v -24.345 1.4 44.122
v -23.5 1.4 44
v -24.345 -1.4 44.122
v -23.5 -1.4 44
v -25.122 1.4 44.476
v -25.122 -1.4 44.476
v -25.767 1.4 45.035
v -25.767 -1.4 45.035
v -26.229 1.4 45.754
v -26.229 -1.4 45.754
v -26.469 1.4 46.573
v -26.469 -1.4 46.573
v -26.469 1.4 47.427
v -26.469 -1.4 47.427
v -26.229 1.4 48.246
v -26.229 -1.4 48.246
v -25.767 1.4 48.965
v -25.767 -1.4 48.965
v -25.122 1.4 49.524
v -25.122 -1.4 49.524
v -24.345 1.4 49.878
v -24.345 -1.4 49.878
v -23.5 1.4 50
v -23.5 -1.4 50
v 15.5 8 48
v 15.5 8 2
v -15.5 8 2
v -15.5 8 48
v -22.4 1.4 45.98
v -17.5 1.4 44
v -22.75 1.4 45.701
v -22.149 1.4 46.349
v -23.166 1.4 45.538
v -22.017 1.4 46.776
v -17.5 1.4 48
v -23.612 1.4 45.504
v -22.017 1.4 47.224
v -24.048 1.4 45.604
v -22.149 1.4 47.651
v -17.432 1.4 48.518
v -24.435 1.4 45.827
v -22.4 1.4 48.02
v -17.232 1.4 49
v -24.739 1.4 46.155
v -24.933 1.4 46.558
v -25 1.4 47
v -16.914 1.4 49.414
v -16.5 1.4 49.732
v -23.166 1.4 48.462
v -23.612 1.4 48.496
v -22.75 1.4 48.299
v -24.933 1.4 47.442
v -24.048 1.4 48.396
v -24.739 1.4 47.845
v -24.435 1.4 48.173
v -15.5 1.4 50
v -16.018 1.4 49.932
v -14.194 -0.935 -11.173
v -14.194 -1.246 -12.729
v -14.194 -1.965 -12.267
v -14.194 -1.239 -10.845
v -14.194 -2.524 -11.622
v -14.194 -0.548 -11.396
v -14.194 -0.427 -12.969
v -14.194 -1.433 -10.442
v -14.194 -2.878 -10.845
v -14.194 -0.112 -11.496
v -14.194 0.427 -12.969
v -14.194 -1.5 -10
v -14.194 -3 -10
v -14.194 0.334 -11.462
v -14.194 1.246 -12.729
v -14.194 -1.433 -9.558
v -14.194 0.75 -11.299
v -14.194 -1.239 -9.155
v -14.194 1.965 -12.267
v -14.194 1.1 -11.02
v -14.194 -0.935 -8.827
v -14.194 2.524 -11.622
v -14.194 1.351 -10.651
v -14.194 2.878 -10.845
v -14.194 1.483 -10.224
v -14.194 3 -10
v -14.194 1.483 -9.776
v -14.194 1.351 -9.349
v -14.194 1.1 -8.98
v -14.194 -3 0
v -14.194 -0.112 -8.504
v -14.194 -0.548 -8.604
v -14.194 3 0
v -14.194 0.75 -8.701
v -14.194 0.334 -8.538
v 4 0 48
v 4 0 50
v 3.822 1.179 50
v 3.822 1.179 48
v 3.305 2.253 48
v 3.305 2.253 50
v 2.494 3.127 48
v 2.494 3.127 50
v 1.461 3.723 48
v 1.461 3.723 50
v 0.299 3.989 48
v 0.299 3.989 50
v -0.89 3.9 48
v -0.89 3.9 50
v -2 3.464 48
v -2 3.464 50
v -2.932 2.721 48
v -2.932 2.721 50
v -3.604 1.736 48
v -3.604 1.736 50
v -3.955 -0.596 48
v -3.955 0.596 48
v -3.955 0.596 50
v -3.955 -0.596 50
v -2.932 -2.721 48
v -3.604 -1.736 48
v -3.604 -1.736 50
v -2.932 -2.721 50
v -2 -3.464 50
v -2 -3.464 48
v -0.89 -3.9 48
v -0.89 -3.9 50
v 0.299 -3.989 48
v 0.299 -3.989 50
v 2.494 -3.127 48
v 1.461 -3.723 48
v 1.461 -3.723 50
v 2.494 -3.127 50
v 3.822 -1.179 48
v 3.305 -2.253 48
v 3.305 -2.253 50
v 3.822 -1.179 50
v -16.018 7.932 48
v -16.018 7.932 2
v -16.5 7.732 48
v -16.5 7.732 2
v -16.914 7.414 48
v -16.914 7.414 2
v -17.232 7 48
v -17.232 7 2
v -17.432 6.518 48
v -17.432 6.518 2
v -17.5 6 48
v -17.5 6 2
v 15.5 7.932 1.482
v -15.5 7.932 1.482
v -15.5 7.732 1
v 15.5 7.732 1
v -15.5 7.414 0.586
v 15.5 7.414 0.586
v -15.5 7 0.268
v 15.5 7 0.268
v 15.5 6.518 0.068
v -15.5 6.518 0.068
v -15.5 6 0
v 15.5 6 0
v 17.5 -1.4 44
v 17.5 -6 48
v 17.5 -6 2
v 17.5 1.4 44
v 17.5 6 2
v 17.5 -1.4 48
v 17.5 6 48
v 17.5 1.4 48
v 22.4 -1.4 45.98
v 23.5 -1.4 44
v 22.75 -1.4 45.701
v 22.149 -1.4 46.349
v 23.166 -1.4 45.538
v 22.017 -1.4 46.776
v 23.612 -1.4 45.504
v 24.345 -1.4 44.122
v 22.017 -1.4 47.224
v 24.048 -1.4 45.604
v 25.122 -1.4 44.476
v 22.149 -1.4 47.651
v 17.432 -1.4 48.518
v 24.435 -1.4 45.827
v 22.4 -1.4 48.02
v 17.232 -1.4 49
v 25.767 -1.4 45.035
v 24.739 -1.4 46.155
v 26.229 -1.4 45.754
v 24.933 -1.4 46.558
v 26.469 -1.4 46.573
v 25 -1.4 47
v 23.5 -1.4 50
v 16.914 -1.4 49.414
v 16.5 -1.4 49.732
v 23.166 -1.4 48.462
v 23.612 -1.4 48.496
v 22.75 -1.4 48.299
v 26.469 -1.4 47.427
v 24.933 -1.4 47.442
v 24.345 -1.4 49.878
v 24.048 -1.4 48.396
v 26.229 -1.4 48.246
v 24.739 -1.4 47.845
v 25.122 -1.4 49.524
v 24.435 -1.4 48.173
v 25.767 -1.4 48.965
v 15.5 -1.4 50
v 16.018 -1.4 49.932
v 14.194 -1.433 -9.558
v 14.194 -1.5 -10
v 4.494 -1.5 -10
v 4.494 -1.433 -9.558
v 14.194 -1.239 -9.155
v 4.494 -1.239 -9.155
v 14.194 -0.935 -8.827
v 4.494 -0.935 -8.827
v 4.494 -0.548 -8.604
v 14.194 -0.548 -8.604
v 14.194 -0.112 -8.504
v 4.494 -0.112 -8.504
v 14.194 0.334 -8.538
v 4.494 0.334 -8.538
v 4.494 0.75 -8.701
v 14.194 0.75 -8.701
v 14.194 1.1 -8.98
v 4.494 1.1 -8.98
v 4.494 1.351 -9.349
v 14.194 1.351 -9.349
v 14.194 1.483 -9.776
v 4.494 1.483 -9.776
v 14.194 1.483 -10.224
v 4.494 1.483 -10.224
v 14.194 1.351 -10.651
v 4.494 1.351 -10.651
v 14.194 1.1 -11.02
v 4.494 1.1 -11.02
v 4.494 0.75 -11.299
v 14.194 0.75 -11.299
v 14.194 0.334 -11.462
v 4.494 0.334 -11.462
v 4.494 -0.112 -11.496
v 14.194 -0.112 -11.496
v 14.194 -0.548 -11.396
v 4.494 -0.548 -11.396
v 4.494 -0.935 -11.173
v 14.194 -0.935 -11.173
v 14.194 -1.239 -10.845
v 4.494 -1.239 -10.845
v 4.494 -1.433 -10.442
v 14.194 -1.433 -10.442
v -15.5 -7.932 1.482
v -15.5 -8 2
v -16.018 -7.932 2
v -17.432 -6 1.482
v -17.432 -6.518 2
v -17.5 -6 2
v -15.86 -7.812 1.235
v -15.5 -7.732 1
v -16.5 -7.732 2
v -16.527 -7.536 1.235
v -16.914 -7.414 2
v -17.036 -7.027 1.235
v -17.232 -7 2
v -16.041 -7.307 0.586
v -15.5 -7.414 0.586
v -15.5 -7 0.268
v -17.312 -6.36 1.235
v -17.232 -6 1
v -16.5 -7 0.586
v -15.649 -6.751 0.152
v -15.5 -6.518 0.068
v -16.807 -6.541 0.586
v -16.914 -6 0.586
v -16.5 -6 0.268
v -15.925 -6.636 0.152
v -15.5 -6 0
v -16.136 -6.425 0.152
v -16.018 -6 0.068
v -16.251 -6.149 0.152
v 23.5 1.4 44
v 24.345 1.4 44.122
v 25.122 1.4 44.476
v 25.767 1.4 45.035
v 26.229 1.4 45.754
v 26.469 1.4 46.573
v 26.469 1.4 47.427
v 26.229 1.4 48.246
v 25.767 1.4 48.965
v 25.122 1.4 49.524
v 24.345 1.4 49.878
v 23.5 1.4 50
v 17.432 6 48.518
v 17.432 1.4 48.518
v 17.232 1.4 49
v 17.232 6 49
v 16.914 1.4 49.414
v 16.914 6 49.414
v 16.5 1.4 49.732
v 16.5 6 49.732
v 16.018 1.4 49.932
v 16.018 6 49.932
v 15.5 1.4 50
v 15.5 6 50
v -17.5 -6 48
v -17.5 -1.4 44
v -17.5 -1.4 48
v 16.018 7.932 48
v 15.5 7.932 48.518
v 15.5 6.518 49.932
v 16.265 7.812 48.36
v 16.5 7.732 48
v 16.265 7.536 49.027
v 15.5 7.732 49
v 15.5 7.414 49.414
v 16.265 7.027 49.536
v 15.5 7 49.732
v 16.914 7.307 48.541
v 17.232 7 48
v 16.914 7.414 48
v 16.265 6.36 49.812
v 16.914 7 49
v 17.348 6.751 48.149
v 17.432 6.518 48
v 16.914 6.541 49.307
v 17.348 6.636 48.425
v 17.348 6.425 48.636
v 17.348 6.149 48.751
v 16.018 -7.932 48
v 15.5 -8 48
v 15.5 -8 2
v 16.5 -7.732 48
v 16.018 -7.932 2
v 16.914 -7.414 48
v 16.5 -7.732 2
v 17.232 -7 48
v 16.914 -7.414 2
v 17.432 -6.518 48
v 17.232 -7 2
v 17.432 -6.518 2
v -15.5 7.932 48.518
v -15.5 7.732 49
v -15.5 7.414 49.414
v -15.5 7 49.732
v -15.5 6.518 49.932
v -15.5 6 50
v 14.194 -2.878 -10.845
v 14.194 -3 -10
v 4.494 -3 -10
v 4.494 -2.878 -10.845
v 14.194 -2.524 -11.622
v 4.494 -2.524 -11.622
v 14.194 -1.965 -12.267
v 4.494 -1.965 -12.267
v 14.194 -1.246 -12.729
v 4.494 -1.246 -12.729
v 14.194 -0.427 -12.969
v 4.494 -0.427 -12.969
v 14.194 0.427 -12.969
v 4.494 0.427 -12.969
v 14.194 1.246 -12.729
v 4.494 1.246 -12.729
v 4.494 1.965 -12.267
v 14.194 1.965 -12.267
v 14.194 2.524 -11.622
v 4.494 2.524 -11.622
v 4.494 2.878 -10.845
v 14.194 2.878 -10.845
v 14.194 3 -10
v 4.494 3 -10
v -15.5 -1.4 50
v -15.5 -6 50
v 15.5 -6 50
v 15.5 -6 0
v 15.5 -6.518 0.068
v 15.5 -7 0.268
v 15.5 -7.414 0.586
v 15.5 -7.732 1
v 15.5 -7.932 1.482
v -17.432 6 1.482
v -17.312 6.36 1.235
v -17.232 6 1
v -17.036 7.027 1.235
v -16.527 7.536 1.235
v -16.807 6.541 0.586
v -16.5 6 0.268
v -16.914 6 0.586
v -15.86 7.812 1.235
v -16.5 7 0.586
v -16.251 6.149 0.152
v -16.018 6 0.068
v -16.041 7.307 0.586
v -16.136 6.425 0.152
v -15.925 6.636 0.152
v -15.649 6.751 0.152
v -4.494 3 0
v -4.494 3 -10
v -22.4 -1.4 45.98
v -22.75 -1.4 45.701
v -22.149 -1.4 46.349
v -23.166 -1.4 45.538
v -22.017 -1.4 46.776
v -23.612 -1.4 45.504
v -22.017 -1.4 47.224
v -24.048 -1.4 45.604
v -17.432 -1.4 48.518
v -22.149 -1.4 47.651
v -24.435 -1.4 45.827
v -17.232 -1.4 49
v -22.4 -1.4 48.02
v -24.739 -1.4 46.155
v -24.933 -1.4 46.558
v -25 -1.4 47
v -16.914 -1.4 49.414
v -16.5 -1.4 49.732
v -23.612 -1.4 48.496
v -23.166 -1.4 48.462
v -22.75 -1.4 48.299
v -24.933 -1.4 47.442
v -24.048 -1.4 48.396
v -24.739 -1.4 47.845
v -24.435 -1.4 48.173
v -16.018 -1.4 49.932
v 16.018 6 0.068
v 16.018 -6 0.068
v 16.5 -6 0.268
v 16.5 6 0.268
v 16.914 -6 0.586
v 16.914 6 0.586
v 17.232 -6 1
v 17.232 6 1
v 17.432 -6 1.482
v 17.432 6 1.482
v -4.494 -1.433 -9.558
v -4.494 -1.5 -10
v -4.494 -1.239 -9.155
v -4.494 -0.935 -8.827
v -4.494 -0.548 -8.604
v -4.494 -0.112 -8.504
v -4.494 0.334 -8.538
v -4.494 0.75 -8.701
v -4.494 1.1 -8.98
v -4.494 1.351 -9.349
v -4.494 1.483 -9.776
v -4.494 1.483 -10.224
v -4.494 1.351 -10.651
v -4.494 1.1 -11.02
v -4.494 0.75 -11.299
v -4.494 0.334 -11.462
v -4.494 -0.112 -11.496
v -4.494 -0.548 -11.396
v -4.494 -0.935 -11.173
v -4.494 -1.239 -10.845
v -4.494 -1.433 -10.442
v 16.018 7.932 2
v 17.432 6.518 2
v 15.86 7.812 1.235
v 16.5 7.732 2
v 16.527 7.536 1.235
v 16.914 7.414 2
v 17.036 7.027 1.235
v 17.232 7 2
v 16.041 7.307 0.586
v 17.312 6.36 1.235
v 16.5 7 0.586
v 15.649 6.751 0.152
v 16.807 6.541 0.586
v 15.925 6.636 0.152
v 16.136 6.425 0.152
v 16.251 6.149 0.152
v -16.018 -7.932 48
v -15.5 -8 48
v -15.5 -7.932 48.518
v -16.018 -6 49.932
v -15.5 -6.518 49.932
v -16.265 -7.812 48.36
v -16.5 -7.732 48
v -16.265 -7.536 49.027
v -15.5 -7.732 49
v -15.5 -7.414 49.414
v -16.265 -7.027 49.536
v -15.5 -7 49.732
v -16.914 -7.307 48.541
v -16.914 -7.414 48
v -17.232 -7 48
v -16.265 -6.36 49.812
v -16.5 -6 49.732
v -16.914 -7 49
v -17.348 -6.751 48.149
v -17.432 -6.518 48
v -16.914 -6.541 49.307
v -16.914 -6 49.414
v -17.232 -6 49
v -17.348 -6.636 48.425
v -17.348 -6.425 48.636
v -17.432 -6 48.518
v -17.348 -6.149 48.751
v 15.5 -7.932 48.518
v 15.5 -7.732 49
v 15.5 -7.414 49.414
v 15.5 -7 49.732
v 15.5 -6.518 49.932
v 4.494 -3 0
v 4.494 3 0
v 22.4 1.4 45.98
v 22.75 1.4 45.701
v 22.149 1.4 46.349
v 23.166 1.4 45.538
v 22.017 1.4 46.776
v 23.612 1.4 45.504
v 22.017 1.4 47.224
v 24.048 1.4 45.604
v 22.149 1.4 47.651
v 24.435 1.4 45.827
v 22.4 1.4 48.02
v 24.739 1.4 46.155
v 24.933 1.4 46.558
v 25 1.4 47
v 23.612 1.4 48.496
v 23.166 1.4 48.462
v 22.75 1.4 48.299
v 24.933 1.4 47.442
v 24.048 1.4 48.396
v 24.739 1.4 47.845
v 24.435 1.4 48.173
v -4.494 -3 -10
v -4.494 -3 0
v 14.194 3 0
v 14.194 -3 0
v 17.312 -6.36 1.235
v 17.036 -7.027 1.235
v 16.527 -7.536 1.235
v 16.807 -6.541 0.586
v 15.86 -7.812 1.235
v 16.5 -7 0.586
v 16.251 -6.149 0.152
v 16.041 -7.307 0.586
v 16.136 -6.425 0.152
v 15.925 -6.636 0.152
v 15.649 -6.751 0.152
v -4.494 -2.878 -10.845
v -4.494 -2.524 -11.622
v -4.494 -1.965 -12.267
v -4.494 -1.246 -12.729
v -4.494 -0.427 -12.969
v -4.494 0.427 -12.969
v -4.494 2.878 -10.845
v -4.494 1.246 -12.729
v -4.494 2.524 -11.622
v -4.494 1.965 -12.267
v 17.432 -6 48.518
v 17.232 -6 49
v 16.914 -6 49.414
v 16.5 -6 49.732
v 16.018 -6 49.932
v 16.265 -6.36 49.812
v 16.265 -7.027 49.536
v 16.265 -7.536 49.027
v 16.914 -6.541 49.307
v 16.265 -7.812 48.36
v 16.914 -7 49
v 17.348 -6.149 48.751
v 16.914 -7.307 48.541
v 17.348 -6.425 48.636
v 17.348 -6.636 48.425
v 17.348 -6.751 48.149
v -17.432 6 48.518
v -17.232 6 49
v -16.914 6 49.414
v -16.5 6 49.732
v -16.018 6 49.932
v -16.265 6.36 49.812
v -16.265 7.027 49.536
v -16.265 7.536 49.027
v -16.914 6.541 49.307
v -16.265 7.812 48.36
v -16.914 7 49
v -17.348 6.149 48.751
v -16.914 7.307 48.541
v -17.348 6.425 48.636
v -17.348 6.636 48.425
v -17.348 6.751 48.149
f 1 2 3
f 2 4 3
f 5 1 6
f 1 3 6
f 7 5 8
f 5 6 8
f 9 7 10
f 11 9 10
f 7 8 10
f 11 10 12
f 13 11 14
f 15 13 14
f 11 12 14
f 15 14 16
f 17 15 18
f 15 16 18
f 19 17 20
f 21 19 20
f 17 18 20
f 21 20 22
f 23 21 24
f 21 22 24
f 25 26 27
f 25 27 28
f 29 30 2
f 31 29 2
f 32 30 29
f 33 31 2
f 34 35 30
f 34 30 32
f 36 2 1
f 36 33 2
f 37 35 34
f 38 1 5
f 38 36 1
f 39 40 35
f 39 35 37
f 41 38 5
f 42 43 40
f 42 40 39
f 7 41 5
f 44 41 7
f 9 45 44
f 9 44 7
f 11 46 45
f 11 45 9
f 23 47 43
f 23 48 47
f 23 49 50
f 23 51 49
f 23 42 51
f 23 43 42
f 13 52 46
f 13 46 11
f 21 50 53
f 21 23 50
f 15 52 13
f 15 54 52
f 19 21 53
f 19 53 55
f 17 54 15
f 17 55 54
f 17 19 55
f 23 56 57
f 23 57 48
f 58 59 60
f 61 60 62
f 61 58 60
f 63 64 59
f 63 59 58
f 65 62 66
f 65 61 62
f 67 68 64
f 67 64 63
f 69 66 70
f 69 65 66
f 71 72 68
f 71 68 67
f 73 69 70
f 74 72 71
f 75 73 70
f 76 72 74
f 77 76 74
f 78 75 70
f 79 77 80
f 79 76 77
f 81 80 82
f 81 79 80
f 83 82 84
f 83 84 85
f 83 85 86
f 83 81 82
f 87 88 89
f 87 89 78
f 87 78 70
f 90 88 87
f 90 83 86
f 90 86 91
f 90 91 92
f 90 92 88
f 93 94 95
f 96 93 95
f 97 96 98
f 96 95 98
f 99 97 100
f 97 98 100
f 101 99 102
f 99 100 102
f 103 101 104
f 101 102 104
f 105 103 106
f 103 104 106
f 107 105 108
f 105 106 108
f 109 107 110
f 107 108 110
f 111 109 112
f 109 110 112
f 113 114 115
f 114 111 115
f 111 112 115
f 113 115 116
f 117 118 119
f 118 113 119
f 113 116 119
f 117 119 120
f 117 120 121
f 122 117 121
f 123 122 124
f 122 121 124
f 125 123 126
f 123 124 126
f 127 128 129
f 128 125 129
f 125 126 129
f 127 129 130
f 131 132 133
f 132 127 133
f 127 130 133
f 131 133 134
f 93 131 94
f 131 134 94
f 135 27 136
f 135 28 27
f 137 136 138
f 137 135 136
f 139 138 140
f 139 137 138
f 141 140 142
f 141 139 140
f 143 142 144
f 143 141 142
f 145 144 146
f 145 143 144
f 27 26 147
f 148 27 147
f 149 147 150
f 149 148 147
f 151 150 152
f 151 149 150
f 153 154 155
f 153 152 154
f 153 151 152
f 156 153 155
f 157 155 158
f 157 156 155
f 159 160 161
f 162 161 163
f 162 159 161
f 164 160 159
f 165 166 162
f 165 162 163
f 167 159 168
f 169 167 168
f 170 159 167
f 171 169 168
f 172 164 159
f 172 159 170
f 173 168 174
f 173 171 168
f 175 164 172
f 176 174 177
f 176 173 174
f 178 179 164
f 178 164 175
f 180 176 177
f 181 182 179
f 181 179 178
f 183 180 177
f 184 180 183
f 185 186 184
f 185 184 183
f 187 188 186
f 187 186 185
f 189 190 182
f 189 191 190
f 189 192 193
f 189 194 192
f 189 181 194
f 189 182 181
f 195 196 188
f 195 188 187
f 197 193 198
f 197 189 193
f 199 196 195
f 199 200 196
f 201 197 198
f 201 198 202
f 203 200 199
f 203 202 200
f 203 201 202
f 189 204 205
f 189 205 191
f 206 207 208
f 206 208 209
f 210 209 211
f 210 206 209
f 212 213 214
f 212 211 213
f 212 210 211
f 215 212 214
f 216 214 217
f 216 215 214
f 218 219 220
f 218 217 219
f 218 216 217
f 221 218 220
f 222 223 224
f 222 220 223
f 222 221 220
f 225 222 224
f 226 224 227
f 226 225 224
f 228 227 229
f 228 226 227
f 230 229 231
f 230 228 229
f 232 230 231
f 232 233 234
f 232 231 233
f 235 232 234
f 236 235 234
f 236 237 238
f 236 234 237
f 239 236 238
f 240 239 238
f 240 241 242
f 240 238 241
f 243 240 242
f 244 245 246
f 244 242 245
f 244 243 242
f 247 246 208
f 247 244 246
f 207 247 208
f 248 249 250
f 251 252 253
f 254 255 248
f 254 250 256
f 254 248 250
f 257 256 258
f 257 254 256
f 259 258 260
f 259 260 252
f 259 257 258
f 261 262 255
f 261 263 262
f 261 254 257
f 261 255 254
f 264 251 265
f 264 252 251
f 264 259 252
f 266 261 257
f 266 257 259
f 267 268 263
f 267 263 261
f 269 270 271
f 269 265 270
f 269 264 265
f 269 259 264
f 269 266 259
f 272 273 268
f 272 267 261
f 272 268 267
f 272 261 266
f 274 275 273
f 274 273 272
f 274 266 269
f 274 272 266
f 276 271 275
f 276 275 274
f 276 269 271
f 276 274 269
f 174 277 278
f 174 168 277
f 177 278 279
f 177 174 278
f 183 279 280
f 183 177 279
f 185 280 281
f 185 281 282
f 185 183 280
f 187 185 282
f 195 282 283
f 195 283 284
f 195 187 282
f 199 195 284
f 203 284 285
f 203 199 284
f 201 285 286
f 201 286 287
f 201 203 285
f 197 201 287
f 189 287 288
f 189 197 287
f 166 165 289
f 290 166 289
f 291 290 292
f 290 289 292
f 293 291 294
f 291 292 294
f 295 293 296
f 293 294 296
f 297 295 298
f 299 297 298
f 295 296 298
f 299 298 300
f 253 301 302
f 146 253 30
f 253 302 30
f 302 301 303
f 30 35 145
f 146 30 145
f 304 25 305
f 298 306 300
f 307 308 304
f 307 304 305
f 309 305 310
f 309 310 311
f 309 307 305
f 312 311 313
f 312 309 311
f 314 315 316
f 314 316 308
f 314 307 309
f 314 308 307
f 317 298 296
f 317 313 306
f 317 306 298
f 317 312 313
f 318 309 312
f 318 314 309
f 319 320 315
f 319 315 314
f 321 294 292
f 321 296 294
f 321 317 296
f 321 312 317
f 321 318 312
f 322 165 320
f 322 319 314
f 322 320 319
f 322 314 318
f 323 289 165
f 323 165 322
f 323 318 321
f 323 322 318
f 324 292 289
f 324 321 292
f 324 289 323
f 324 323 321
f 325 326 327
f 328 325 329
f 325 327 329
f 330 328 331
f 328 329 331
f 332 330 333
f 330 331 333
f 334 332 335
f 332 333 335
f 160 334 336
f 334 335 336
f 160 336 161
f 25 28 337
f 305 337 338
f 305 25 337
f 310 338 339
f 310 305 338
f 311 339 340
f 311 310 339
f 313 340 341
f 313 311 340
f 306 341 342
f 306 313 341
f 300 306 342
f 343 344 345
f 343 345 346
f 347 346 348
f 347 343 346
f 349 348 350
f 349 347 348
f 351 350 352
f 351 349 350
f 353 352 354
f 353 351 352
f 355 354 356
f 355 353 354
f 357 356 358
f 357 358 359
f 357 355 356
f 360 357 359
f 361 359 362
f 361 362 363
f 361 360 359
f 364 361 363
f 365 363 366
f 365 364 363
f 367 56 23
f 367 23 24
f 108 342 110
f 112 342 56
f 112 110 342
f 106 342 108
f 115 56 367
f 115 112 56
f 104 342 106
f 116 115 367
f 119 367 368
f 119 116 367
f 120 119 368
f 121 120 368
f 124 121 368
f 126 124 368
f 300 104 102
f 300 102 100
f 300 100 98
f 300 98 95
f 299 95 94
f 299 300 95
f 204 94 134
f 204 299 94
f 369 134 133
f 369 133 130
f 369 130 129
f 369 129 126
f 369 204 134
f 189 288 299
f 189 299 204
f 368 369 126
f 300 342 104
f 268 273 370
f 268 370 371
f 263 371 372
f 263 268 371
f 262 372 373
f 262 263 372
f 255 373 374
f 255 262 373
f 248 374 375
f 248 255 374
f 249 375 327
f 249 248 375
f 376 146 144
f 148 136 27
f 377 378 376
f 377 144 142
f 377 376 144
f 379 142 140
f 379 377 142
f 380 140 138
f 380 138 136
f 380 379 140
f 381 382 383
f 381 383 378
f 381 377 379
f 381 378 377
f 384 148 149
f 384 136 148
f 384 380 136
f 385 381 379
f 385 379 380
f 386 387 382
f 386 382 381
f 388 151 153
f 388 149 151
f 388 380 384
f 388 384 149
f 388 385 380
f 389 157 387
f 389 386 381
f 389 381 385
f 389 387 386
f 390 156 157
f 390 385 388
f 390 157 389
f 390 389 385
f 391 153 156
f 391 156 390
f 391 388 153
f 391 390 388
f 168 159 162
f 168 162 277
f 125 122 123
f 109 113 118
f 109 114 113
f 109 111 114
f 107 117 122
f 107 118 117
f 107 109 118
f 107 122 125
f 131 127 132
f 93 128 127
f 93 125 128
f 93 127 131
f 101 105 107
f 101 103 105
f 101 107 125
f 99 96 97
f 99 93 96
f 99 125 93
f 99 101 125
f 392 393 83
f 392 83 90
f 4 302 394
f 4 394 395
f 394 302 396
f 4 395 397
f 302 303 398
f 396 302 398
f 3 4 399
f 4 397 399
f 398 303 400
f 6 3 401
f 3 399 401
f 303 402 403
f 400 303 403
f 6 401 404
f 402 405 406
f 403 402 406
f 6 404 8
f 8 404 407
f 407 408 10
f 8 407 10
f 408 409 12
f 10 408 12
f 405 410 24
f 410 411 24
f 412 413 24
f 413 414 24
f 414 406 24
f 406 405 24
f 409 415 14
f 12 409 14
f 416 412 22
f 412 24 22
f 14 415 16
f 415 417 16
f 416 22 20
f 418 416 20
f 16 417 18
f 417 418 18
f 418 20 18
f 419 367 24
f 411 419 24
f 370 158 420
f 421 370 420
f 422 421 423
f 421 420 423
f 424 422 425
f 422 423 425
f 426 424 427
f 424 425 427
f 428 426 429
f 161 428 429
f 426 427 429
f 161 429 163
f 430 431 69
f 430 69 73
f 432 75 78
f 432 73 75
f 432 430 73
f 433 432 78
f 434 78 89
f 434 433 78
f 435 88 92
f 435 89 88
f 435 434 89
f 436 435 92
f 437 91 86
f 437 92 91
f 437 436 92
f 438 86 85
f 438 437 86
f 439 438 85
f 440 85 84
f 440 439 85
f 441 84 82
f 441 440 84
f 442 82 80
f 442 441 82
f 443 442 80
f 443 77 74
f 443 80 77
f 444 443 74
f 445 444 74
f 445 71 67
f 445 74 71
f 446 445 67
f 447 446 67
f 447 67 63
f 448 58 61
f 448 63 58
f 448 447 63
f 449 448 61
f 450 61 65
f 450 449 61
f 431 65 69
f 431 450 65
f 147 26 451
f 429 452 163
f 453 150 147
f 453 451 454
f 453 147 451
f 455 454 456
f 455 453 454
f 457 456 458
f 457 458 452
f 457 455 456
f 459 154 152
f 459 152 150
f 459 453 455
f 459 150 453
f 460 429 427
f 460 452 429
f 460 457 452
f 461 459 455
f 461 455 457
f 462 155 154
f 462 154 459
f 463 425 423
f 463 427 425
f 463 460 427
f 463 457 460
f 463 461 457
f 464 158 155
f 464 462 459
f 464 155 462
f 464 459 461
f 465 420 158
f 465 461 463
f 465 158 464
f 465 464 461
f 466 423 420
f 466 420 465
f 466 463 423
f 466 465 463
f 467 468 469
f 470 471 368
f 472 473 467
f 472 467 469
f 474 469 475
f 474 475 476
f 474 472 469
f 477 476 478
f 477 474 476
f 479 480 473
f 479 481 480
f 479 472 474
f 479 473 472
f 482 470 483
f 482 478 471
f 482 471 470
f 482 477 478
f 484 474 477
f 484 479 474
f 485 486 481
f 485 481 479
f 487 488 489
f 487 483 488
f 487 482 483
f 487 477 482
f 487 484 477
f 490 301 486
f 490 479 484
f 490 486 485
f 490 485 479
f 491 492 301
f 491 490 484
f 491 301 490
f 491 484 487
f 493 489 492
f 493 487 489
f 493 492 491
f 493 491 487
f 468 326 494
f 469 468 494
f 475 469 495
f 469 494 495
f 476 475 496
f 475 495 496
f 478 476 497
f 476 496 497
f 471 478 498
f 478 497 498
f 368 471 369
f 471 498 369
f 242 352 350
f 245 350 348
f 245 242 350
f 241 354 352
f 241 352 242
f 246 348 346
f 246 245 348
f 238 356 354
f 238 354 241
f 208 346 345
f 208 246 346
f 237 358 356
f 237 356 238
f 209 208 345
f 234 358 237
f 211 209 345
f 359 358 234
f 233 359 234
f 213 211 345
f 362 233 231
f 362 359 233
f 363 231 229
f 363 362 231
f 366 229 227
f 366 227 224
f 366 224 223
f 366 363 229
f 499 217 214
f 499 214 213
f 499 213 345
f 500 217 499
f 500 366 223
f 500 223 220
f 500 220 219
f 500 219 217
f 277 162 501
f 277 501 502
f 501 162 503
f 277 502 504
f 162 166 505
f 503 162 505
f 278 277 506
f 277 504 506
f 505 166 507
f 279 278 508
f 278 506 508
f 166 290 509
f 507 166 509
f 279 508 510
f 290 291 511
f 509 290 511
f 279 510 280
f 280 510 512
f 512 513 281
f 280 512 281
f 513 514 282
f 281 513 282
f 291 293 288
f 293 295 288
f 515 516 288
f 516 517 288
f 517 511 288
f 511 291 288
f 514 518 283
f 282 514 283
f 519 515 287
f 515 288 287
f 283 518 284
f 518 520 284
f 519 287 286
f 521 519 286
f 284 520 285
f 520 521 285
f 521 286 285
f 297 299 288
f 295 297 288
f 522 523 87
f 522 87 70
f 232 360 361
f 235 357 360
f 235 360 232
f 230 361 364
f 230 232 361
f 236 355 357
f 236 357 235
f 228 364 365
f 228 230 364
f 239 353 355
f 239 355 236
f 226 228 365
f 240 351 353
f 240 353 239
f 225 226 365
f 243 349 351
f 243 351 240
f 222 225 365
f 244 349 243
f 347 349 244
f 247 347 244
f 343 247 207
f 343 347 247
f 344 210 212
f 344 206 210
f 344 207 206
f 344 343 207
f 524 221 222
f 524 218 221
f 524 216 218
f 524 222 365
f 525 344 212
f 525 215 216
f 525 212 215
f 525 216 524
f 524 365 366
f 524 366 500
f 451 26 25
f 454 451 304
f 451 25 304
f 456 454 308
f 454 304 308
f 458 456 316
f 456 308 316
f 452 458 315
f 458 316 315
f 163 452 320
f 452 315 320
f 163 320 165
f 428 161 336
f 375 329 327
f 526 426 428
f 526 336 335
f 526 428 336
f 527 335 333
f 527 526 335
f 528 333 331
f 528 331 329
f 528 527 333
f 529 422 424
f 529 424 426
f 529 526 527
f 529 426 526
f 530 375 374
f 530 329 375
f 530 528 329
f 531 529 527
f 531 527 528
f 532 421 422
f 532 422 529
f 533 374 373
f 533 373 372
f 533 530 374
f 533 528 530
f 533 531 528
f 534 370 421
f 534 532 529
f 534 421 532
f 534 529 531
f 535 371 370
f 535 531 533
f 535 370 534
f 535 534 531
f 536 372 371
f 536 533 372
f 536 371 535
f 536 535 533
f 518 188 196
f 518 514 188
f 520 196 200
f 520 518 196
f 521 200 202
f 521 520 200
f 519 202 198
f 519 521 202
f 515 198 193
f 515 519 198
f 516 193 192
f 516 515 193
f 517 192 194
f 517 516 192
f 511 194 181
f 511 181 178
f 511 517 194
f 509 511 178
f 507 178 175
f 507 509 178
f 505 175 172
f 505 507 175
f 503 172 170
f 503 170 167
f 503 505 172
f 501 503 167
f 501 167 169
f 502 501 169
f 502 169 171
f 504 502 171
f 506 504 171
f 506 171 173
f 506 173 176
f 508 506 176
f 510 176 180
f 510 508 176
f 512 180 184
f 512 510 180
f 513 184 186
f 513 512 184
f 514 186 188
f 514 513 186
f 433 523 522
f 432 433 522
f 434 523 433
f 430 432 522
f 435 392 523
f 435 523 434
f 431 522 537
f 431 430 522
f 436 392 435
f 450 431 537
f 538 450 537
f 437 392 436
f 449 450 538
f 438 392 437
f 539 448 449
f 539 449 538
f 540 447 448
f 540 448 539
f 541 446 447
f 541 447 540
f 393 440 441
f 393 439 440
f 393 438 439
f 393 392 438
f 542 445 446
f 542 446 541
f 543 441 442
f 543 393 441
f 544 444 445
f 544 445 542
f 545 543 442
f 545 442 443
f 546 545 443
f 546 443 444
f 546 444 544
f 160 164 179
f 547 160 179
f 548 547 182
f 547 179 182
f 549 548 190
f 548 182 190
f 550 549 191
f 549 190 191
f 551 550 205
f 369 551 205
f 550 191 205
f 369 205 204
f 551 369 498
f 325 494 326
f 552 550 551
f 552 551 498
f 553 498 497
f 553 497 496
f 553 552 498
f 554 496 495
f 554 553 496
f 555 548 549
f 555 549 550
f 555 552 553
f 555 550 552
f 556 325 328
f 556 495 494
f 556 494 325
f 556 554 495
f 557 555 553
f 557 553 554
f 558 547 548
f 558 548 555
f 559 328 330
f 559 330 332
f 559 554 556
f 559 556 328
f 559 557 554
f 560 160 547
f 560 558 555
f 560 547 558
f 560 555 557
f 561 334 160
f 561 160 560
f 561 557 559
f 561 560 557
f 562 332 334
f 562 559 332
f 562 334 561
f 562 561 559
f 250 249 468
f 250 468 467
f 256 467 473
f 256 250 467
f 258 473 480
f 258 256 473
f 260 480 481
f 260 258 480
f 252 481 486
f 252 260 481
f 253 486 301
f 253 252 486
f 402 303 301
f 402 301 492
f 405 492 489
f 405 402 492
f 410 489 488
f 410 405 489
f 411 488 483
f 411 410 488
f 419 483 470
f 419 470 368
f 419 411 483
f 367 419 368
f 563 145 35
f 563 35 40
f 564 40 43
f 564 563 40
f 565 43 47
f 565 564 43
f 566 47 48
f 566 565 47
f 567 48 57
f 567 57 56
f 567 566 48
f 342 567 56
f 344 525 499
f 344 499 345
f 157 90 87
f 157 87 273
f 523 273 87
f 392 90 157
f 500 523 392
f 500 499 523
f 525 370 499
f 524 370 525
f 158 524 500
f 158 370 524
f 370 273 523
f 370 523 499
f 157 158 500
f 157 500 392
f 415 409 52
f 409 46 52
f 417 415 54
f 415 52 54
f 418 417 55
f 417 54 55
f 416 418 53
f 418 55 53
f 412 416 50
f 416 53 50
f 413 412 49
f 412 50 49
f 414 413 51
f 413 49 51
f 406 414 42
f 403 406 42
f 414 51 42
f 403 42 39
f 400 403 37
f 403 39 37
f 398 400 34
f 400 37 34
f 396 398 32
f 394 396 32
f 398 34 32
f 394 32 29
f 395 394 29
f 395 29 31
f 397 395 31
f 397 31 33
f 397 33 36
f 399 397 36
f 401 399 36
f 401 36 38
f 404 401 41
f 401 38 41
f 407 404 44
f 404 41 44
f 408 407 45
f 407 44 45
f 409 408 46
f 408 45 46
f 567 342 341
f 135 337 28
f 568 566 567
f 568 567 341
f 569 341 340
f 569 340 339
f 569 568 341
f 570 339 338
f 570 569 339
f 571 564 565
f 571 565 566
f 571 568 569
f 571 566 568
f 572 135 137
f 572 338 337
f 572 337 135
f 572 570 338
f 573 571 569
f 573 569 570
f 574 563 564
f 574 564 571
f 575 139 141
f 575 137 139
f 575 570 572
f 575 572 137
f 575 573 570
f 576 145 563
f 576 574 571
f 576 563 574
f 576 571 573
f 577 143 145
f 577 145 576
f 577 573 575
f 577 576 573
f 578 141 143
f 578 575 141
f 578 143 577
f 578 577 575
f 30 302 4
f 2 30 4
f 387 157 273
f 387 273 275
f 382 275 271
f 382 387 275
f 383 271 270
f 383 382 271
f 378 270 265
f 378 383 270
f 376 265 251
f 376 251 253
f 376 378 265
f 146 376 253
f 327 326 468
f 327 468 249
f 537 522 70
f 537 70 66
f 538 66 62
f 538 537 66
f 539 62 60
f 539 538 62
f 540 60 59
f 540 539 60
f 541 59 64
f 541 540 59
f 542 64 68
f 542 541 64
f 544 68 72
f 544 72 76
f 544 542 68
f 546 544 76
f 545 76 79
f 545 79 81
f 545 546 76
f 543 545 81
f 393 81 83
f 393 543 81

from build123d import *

# Parameters (mm, degrees)
F1_DEPTH      = 17.5
F2_W          = 6.3770967536
F2_H          = 17.8738087416
F2_W_2        = 4.4888177946
F3_DEPTH      = 12.5
F5_R          = 4
F6_DEPTH      = 2
F7_R          = 1.5
F8_DEPTH      = 1.4
F10_R         = 2
F11_T1_DEPTH  = 12
F11_T3_DEPTH  = 4.6
F11_T5_DEPTH  = 4.6
F11_S9_W      = 2
F11_S9_H      = 2
F11_T10_DEPTH = 2
F11_S15_W     = 2
F11_S15_H     = 2
F11_T16_DEPTH = 2
F11_S21_W     = 2
F11_S21_H     = 2
F11_T22_DEPTH = 2
F11_S27_W     = 2
F11_S27_H     = 2
F11_T28_DEPTH = 2
F11_S33_W     = 2
F11_S33_H     = 2
F11_T34_DEPTH = 2
F11_S39_W     = 2
F11_S39_H     = 2
F11_T40_DEPTH = 2
F11_S45_W     = 2
F11_S45_H     = 2
F11_T46_DEPTH = 2
F11_S51_W     = 2
F11_S51_H     = 2
F11_T52_DEPTH = 2
F11_T58_DEPTH = 9.6
F11_T63_DEPTH = 9.6
F11_T68_DEPTH = 9.6
F11_T73_DEPTH = 9.6


# Not quite as in the source:
# - a fillet or chamfer that OpenCascade refuses, or shapes differently, is made with other operations: its cross-section is extruded or revolved along the edge and cut away or added


with BuildPart() as f1:
    # F0 (on Right) → F1 (new body, symmetric)
    with BuildSketch(Plane.YZ):
        Polygon((3, 0), (8, 0), (8, 50), (-8, 50), (-8, 0), (-3, 0), align=None)
        with BuildLine():
            Line((3, -10), (3, 0))
            Line((3, 0), (-3, 0))
            Line((-3, 0), (-3, -10))
            ThreePointArc((-3, -10), (0, -7), (3, -10))
        make_face()
        with BuildLine():
            ThreePointArc((-3, -10), (0, -13), (3, -10))
            ThreePointArc((3, -10), (0, -7), (-3, -10))
        make_face()
        with BuildLine():
            ThreePointArc((1.5, -10), (0, -11.5), (-1.5, -10))
            ThreePointArc((-1.5, -10), (0, -8.5), (1.5, -10))
        make_face(mode=Mode.SUBTRACT)
    extrude(amount=F1_DEPTH, both=True)

    # F2 (on Front) → F3 (cut, symmetric)
    with BuildSketch(Plane.XZ):
        with Locations((-17.3829572741, -8.9369043708)):
            Rectangle(F2_W, F2_H)
        Polygon((-0.0055911027, 0), (-4.4944088973, 0), (-4.4944088973, -17.8738087416), (-0.0055911027, -17.8738087416), (0.0055911027, -17.8738087416), (0.0055911027, 0), align=None)
        with Locations((2.25, -8.9369043708)):
            Rectangle(F2_W_2, F2_H)
        with Locations((17.3829572741, -8.9369043708)):
            Rectangle(F2_W, F2_H)
    extrude(amount=F3_DEPTH, both=True, mode=Mode.SUBTRACT)

    # F5 (on offset) → F6 (cut)
    with BuildSketch(Plane.XY.offset(50)):
        Circle(F5_R)
    extrude(amount=-F6_DEPTH, mode=Mode.SUBTRACT)

    # F7 (on Front) → F8 (join, symmetric)
    with BuildSketch(Plane.XZ):
        with BuildLine():
            Line((23.5, 50), (17.5, 50))
            Line((17.5, 50), (17.5, 44))
            Line((17.5, 44), (23.5, 44))
            ThreePointArc((23.5, 44), (26.5, 47), (23.5, 50))
        make_face()
        with Locations((23.5, 47)):
            Circle(F7_R, mode=Mode.SUBTRACT)
    extrude(amount=F8_DEPTH, both=True)

    # F9: F1 across plane


with BuildPart() as f1_1:
    add(f1.part)
    add(f1.part.mirror(Plane.YZ))

    # F10
    f10_edges = [f1_1.edges().sort_by_distance(p)[0] for p in [
        (0, -8, 50),
        (-17.5, -8, 25),
        (0, -8, 0),
        (17.5, -8, 25),
        (0, 8, 0),
        (-17.5, 8, 25),
        (0, 8, 50),
        (17.5, 8, 25),
    ]]
    fillet(f10_edges, radius=F10_R)

    # F11: fillet of radius 2 on 8 edges, made by hand

    # F11_s2 → F11_t1 (cut)
    with BuildSketch(Plane.XZ.offset(-6)):
        with BuildLine():
            ThreePointArc((15.5, 0), (16.9142135624, 0.5857864376), (17.5, 2))
            Line((17.5, 2), (17.5, 0))
            Line((17.5, 0), (15.5, 0))
        make_face()
        with BuildLine():
            ThreePointArc((-15.5, 0), (-16.9142135624, 0.5857864376), (-17.5, 2))
            Line((-17.5, 2), (-17.5, 0))
            Line((-17.5, 0), (-15.5, 0))
        make_face()
    extrude(amount=F11_T1_DEPTH, mode=Mode.SUBTRACT)

    # F11_s4 → F11_t3 (cut)
    with BuildSketch(Plane.XZ.offset(-6)):
        with BuildLine():
            ThreePointArc((17.5, 48), (16.9142135624, 49.4142135624), (15.5, 50))
            Line((15.5, 50), (17.5, 50))
            Line((17.5, 50), (17.5, 48))
        make_face()
        with BuildLine():
            ThreePointArc((-17.5, 48), (-16.9142135624, 49.4142135624), (-15.5, 50))
            Line((-15.5, 50), (-17.5, 50))
            Line((-17.5, 50), (-17.5, 48))
        make_face()
    extrude(amount=F11_T3_DEPTH, mode=Mode.SUBTRACT)

    # F11_s6 → F11_t5 (cut)
    with BuildSketch(Plane.XZ.offset(1.4)):
        with BuildLine():
            ThreePointArc((17.5, 48), (16.9142135624, 49.4142135624), (15.5, 50))
            Line((15.5, 50), (17.5, 50))
            Line((17.5, 50), (17.5, 48))
        make_face()
        with BuildLine():
            ThreePointArc((-17.5, 48), (-16.9142135624, 49.4142135624), (-15.5, 50))
            Line((-15.5, 50), (-17.5, 50))
            Line((-17.5, 50), (-17.5, 48))
        make_face()
    extrude(amount=F11_T5_DEPTH, mode=Mode.SUBTRACT)


with BuildPart() as f11_tool8:
    # F11_s9 → F11_t10 (new body)
    with BuildSketch(Plane.YZ.offset(-15.5)):
        with Locations((7, 49)):
            Rectangle(F11_S9_W, F11_S9_H)
    extrude(amount=-F11_T10_DEPTH)

    # F11_s11 → F11_t12 (revolve, cut)
    with BuildSketch(Plane(origin=(-15.5, 6, 48), x_dir=(0, -0.7071067812, -0.7071067812), z_dir=(0, 0.7071067812, -0.7071067812))):
        with BuildLine():
            ThreePointArc((0, -2), (2, 0), (0, 2))
            Line((0, 2), (0, -2))
        make_face()
    revolve(axis=Axis((-15.5, 6, 48), (-1, 0, 0)), mode=Mode.SUBTRACT)


with BuildPart() as f1_2:
    add(f1_1.part)

    # F11_t7: cut F11_tool8
    add(f11_tool8.part, mode=Mode.SUBTRACT)


with BuildPart() as f11_tool14:
    # F11_s15 → F11_t16 (new body)
    with BuildSketch(Plane.YZ.offset(-15.5)):
        with Locations((-7, 49)):
            Rectangle(F11_S15_W, F11_S15_H)
    extrude(amount=-F11_T16_DEPTH)

    # F11_s17 → F11_t18 (revolve, cut)
    with BuildSketch(Plane(origin=(-15.5, -6, 48), x_dir=(0, 0.7071067812, -0.7071067812), z_dir=(0, 0.7071067812, 0.7071067812))):
        with BuildLine():
            ThreePointArc((0, -2), (2, 0), (0, 2))
            Line((0, 2), (0, -2))
        make_face()
    revolve(axis=Axis((-15.5, -6, 48), (-1, 0, 0)), mode=Mode.SUBTRACT)


with BuildPart() as f1_3:
    add(f1_2.part)

    # F11_t13: cut F11_tool14
    add(f11_tool14.part, mode=Mode.SUBTRACT)


with BuildPart() as f11_tool20:
    # F11_s21 → F11_t22 (new body)
    with BuildSketch(Plane.YZ.offset(15.5)):
        with Locations((-7, 49)):
            Rectangle(F11_S21_W, F11_S21_H)
    extrude(amount=F11_T22_DEPTH)

    # F11_s23 → F11_t24 (revolve, cut)
    with BuildSketch(Plane(origin=(15.5, -6, 48), x_dir=(0, 0.7071067812, -0.7071067812), z_dir=(0, -0.7071067812, -0.7071067812))):
        with BuildLine():
            ThreePointArc((0, -2), (2, 0), (0, 2))
            Line((0, 2), (0, -2))
        make_face()
    revolve(axis=Axis((15.5, -6, 48), (1, 0, 0)), mode=Mode.SUBTRACT)


with BuildPart() as f1_4:
    add(f1_3.part)

    # F11_t19: cut F11_tool20
    add(f11_tool20.part, mode=Mode.SUBTRACT)


with BuildPart() as f11_tool26:
    # F11_s27 → F11_t28 (new body)
    with BuildSketch(Plane.YZ.offset(15.5)):
        with Locations((7, 49)):
            Rectangle(F11_S27_W, F11_S27_H)
    extrude(amount=F11_T28_DEPTH)

    # F11_s29 → F11_t30 (revolve, cut)
    with BuildSketch(Plane(origin=(15.5, 6, 48), x_dir=(0, -0.7071067812, -0.7071067812), z_dir=(0, -0.7071067812, 0.7071067812))):
        with BuildLine():
            ThreePointArc((0, -2), (2, 0), (0, 2))
            Line((0, 2), (0, -2))
        make_face()
    revolve(axis=Axis((15.5, 6, 48), (1, 0, 0)), mode=Mode.SUBTRACT)


with BuildPart() as f1_5:
    add(f1_4.part)

    # F11_t25: cut F11_tool26
    add(f11_tool26.part, mode=Mode.SUBTRACT)


with BuildPart() as f11_tool32:
    # F11_s33 → F11_t34 (new body)
    with BuildSketch(Plane.XY.offset(2)):
        with Locations((-16.5, -7)):
            Rectangle(F11_S33_W, F11_S33_H)
    extrude(amount=-F11_T34_DEPTH)

    # F11_s35 → F11_t36 (revolve, cut)
    with BuildSketch(Plane(origin=(-15.5, -6, 2), x_dir=(0.7071067812, 0.7071067812, 0), z_dir=(-0.7071067812, 0.7071067812, 0))):
        with BuildLine():
            ThreePointArc((0, -2), (2, 0), (0, 2))
            Line((0, 2), (0, -2))
        make_face()
    revolve(axis=Axis((-15.5, -6, 2), (0, 0, -1)), mode=Mode.SUBTRACT)


with BuildPart() as f1_6:
    add(f1_5.part)

    # F11_t31: cut F11_tool32
    add(f11_tool32.part, mode=Mode.SUBTRACT)


with BuildPart() as f11_tool38:
    # F11_s39 → F11_t40 (new body)
    with BuildSketch(Plane.XY.offset(2)):
        with Locations((-16.5, 7)):
            Rectangle(F11_S39_W, F11_S39_H)
    extrude(amount=-F11_T40_DEPTH)

    # F11_s41 → F11_t42 (revolve, cut)
    with BuildSketch(Plane(origin=(-15.5, 6, 2), x_dir=(0.7071067812, -0.7071067812, 0), z_dir=(0.7071067812, 0.7071067812, 0))):
        with BuildLine():
            ThreePointArc((0, -2), (2, 0), (0, 2))
            Line((0, 2), (0, -2))
        make_face()
    revolve(axis=Axis((-15.5, 6, 2), (0, 0, -1)), mode=Mode.SUBTRACT)


with BuildPart() as f1_7:
    add(f1_6.part)

    # F11_t37: cut F11_tool38
    add(f11_tool38.part, mode=Mode.SUBTRACT)


with BuildPart() as f11_tool44:
    # F11_s45 → F11_t46 (new body)
    with BuildSketch(Plane.XY.offset(2)):
        with Locations((16.5, 7)):
            Rectangle(F11_S45_W, F11_S45_H)
    extrude(amount=-F11_T46_DEPTH)

    # F11_s47 → F11_t48 (revolve, cut)
    with BuildSketch(Plane(origin=(15.5, 6, 2), x_dir=(-0.7071067812, -0.7071067812, 0), z_dir=(0.7071067812, -0.7071067812, 0))):
        with BuildLine():
            ThreePointArc((0, -2), (2, 0), (0, 2))
            Line((0, 2), (0, -2))
        make_face()
    revolve(axis=Axis((15.5, 6, 2), (0, 0, -1)), mode=Mode.SUBTRACT)


with BuildPart() as f1_8:
    add(f1_7.part)

    # F11_t43: cut F11_tool44
    add(f11_tool44.part, mode=Mode.SUBTRACT)


with BuildPart() as f11_tool50:
    # F11_s51 → F11_t52 (new body)
    with BuildSketch(Plane.XY.offset(2)):
        with Locations((16.5, -7)):
            Rectangle(F11_S51_W, F11_S51_H)
    extrude(amount=-F11_T52_DEPTH)

    # F11_s53 → F11_t54 (revolve, cut)
    with BuildSketch(Plane(origin=(15.5, -6, 2), x_dir=(-0.7071067812, 0.7071067812, 0), z_dir=(-0.7071067812, -0.7071067812, 0))):
        with BuildLine():
            ThreePointArc((0, -2), (2, 0), (0, 2))
            Line((0, 2), (0, -2))
        make_face()
    revolve(axis=Axis((15.5, -6, 2), (0, 0, -1)), mode=Mode.SUBTRACT)


with BuildPart() as f1_9:
    add(f1_8.part)

    # F11_t49: cut F11_tool50
    add(f11_tool50.part, mode=Mode.SUBTRACT)


with BuildPart() as f11_tool56:
    # F11_s57 → F11_t58 (new body)
    with BuildSketch(Plane.XZ.offset(-6)):
        with BuildLine():
            ThreePointArc((17.5, 48), (16.9142135624, 49.4142135624), (15.5, 50))
            Line((15.5, 50), (17.5, 50))
            Line((17.5, 50), (17.5, 48))
        make_face()
    extrude(amount=F11_T58_DEPTH)

    split(bisect_by=Plane.XZ.offset(1.4), keep=Keep.TOP)


with BuildPart() as f1_10:
    add(f1_9.part)

    # F11_t55: cut F11_tool56
    add(f11_tool56.part, mode=Mode.SUBTRACT)


with BuildPart() as f11_tool61:
    # F11_s62 → F11_t63 (new body)
    with BuildSketch(Plane.XZ.offset(-3.6)):
        with BuildLine():
            ThreePointArc((17.5, 48), (16.9142135624, 49.4142135624), (15.5, 50))
            Line((15.5, 50), (17.5, 50))
            Line((17.5, 50), (17.5, 48))
        make_face()
    extrude(amount=F11_T63_DEPTH)

    split(bisect_by=Plane.XZ.offset(-1.4), keep=Keep.BOTTOM)


with BuildPart() as f1_11:
    add(f1_10.part)

    # F11_t60: cut F11_tool61
    add(f11_tool61.part, mode=Mode.SUBTRACT)


with BuildPart() as f11_tool66:
    # F11_s67 → F11_t68 (new body)
    with BuildSketch(Plane.XZ.offset(-3.6)):
        with BuildLine():
            ThreePointArc((-17.5, 48), (-16.9142135624, 49.4142135624), (-15.5, 50))
            Line((-15.5, 50), (-17.5, 50))
            Line((-17.5, 50), (-17.5, 48))
        make_face()
    extrude(amount=F11_T68_DEPTH)

    split(bisect_by=Plane.XZ.offset(-1.4), keep=Keep.BOTTOM)


with BuildPart() as f1_12:
    add(f1_11.part)

    # F11_t65: cut F11_tool66
    add(f11_tool66.part, mode=Mode.SUBTRACT)


with BuildPart() as f11_tool71:
    # F11_s72 → F11_t73 (new body)
    with BuildSketch(Plane.XZ.offset(-6)):
        with BuildLine():
            ThreePointArc((-17.5, 48), (-16.9142135624, 49.4142135624), (-15.5, 50))
            Line((-15.5, 50), (-17.5, 50))
            Line((-17.5, 50), (-17.5, 48))
        make_face()
    extrude(amount=F11_T73_DEPTH)

    split(bisect_by=Plane.XZ.offset(1.4), keep=Keep.TOP)


with BuildPart() as f1_13:
    add(f1_12.part)

    # F11_t70: cut F11_tool71
    add(f11_tool71.part, mode=Mode.SUBTRACT)


solid = f1_13.part
